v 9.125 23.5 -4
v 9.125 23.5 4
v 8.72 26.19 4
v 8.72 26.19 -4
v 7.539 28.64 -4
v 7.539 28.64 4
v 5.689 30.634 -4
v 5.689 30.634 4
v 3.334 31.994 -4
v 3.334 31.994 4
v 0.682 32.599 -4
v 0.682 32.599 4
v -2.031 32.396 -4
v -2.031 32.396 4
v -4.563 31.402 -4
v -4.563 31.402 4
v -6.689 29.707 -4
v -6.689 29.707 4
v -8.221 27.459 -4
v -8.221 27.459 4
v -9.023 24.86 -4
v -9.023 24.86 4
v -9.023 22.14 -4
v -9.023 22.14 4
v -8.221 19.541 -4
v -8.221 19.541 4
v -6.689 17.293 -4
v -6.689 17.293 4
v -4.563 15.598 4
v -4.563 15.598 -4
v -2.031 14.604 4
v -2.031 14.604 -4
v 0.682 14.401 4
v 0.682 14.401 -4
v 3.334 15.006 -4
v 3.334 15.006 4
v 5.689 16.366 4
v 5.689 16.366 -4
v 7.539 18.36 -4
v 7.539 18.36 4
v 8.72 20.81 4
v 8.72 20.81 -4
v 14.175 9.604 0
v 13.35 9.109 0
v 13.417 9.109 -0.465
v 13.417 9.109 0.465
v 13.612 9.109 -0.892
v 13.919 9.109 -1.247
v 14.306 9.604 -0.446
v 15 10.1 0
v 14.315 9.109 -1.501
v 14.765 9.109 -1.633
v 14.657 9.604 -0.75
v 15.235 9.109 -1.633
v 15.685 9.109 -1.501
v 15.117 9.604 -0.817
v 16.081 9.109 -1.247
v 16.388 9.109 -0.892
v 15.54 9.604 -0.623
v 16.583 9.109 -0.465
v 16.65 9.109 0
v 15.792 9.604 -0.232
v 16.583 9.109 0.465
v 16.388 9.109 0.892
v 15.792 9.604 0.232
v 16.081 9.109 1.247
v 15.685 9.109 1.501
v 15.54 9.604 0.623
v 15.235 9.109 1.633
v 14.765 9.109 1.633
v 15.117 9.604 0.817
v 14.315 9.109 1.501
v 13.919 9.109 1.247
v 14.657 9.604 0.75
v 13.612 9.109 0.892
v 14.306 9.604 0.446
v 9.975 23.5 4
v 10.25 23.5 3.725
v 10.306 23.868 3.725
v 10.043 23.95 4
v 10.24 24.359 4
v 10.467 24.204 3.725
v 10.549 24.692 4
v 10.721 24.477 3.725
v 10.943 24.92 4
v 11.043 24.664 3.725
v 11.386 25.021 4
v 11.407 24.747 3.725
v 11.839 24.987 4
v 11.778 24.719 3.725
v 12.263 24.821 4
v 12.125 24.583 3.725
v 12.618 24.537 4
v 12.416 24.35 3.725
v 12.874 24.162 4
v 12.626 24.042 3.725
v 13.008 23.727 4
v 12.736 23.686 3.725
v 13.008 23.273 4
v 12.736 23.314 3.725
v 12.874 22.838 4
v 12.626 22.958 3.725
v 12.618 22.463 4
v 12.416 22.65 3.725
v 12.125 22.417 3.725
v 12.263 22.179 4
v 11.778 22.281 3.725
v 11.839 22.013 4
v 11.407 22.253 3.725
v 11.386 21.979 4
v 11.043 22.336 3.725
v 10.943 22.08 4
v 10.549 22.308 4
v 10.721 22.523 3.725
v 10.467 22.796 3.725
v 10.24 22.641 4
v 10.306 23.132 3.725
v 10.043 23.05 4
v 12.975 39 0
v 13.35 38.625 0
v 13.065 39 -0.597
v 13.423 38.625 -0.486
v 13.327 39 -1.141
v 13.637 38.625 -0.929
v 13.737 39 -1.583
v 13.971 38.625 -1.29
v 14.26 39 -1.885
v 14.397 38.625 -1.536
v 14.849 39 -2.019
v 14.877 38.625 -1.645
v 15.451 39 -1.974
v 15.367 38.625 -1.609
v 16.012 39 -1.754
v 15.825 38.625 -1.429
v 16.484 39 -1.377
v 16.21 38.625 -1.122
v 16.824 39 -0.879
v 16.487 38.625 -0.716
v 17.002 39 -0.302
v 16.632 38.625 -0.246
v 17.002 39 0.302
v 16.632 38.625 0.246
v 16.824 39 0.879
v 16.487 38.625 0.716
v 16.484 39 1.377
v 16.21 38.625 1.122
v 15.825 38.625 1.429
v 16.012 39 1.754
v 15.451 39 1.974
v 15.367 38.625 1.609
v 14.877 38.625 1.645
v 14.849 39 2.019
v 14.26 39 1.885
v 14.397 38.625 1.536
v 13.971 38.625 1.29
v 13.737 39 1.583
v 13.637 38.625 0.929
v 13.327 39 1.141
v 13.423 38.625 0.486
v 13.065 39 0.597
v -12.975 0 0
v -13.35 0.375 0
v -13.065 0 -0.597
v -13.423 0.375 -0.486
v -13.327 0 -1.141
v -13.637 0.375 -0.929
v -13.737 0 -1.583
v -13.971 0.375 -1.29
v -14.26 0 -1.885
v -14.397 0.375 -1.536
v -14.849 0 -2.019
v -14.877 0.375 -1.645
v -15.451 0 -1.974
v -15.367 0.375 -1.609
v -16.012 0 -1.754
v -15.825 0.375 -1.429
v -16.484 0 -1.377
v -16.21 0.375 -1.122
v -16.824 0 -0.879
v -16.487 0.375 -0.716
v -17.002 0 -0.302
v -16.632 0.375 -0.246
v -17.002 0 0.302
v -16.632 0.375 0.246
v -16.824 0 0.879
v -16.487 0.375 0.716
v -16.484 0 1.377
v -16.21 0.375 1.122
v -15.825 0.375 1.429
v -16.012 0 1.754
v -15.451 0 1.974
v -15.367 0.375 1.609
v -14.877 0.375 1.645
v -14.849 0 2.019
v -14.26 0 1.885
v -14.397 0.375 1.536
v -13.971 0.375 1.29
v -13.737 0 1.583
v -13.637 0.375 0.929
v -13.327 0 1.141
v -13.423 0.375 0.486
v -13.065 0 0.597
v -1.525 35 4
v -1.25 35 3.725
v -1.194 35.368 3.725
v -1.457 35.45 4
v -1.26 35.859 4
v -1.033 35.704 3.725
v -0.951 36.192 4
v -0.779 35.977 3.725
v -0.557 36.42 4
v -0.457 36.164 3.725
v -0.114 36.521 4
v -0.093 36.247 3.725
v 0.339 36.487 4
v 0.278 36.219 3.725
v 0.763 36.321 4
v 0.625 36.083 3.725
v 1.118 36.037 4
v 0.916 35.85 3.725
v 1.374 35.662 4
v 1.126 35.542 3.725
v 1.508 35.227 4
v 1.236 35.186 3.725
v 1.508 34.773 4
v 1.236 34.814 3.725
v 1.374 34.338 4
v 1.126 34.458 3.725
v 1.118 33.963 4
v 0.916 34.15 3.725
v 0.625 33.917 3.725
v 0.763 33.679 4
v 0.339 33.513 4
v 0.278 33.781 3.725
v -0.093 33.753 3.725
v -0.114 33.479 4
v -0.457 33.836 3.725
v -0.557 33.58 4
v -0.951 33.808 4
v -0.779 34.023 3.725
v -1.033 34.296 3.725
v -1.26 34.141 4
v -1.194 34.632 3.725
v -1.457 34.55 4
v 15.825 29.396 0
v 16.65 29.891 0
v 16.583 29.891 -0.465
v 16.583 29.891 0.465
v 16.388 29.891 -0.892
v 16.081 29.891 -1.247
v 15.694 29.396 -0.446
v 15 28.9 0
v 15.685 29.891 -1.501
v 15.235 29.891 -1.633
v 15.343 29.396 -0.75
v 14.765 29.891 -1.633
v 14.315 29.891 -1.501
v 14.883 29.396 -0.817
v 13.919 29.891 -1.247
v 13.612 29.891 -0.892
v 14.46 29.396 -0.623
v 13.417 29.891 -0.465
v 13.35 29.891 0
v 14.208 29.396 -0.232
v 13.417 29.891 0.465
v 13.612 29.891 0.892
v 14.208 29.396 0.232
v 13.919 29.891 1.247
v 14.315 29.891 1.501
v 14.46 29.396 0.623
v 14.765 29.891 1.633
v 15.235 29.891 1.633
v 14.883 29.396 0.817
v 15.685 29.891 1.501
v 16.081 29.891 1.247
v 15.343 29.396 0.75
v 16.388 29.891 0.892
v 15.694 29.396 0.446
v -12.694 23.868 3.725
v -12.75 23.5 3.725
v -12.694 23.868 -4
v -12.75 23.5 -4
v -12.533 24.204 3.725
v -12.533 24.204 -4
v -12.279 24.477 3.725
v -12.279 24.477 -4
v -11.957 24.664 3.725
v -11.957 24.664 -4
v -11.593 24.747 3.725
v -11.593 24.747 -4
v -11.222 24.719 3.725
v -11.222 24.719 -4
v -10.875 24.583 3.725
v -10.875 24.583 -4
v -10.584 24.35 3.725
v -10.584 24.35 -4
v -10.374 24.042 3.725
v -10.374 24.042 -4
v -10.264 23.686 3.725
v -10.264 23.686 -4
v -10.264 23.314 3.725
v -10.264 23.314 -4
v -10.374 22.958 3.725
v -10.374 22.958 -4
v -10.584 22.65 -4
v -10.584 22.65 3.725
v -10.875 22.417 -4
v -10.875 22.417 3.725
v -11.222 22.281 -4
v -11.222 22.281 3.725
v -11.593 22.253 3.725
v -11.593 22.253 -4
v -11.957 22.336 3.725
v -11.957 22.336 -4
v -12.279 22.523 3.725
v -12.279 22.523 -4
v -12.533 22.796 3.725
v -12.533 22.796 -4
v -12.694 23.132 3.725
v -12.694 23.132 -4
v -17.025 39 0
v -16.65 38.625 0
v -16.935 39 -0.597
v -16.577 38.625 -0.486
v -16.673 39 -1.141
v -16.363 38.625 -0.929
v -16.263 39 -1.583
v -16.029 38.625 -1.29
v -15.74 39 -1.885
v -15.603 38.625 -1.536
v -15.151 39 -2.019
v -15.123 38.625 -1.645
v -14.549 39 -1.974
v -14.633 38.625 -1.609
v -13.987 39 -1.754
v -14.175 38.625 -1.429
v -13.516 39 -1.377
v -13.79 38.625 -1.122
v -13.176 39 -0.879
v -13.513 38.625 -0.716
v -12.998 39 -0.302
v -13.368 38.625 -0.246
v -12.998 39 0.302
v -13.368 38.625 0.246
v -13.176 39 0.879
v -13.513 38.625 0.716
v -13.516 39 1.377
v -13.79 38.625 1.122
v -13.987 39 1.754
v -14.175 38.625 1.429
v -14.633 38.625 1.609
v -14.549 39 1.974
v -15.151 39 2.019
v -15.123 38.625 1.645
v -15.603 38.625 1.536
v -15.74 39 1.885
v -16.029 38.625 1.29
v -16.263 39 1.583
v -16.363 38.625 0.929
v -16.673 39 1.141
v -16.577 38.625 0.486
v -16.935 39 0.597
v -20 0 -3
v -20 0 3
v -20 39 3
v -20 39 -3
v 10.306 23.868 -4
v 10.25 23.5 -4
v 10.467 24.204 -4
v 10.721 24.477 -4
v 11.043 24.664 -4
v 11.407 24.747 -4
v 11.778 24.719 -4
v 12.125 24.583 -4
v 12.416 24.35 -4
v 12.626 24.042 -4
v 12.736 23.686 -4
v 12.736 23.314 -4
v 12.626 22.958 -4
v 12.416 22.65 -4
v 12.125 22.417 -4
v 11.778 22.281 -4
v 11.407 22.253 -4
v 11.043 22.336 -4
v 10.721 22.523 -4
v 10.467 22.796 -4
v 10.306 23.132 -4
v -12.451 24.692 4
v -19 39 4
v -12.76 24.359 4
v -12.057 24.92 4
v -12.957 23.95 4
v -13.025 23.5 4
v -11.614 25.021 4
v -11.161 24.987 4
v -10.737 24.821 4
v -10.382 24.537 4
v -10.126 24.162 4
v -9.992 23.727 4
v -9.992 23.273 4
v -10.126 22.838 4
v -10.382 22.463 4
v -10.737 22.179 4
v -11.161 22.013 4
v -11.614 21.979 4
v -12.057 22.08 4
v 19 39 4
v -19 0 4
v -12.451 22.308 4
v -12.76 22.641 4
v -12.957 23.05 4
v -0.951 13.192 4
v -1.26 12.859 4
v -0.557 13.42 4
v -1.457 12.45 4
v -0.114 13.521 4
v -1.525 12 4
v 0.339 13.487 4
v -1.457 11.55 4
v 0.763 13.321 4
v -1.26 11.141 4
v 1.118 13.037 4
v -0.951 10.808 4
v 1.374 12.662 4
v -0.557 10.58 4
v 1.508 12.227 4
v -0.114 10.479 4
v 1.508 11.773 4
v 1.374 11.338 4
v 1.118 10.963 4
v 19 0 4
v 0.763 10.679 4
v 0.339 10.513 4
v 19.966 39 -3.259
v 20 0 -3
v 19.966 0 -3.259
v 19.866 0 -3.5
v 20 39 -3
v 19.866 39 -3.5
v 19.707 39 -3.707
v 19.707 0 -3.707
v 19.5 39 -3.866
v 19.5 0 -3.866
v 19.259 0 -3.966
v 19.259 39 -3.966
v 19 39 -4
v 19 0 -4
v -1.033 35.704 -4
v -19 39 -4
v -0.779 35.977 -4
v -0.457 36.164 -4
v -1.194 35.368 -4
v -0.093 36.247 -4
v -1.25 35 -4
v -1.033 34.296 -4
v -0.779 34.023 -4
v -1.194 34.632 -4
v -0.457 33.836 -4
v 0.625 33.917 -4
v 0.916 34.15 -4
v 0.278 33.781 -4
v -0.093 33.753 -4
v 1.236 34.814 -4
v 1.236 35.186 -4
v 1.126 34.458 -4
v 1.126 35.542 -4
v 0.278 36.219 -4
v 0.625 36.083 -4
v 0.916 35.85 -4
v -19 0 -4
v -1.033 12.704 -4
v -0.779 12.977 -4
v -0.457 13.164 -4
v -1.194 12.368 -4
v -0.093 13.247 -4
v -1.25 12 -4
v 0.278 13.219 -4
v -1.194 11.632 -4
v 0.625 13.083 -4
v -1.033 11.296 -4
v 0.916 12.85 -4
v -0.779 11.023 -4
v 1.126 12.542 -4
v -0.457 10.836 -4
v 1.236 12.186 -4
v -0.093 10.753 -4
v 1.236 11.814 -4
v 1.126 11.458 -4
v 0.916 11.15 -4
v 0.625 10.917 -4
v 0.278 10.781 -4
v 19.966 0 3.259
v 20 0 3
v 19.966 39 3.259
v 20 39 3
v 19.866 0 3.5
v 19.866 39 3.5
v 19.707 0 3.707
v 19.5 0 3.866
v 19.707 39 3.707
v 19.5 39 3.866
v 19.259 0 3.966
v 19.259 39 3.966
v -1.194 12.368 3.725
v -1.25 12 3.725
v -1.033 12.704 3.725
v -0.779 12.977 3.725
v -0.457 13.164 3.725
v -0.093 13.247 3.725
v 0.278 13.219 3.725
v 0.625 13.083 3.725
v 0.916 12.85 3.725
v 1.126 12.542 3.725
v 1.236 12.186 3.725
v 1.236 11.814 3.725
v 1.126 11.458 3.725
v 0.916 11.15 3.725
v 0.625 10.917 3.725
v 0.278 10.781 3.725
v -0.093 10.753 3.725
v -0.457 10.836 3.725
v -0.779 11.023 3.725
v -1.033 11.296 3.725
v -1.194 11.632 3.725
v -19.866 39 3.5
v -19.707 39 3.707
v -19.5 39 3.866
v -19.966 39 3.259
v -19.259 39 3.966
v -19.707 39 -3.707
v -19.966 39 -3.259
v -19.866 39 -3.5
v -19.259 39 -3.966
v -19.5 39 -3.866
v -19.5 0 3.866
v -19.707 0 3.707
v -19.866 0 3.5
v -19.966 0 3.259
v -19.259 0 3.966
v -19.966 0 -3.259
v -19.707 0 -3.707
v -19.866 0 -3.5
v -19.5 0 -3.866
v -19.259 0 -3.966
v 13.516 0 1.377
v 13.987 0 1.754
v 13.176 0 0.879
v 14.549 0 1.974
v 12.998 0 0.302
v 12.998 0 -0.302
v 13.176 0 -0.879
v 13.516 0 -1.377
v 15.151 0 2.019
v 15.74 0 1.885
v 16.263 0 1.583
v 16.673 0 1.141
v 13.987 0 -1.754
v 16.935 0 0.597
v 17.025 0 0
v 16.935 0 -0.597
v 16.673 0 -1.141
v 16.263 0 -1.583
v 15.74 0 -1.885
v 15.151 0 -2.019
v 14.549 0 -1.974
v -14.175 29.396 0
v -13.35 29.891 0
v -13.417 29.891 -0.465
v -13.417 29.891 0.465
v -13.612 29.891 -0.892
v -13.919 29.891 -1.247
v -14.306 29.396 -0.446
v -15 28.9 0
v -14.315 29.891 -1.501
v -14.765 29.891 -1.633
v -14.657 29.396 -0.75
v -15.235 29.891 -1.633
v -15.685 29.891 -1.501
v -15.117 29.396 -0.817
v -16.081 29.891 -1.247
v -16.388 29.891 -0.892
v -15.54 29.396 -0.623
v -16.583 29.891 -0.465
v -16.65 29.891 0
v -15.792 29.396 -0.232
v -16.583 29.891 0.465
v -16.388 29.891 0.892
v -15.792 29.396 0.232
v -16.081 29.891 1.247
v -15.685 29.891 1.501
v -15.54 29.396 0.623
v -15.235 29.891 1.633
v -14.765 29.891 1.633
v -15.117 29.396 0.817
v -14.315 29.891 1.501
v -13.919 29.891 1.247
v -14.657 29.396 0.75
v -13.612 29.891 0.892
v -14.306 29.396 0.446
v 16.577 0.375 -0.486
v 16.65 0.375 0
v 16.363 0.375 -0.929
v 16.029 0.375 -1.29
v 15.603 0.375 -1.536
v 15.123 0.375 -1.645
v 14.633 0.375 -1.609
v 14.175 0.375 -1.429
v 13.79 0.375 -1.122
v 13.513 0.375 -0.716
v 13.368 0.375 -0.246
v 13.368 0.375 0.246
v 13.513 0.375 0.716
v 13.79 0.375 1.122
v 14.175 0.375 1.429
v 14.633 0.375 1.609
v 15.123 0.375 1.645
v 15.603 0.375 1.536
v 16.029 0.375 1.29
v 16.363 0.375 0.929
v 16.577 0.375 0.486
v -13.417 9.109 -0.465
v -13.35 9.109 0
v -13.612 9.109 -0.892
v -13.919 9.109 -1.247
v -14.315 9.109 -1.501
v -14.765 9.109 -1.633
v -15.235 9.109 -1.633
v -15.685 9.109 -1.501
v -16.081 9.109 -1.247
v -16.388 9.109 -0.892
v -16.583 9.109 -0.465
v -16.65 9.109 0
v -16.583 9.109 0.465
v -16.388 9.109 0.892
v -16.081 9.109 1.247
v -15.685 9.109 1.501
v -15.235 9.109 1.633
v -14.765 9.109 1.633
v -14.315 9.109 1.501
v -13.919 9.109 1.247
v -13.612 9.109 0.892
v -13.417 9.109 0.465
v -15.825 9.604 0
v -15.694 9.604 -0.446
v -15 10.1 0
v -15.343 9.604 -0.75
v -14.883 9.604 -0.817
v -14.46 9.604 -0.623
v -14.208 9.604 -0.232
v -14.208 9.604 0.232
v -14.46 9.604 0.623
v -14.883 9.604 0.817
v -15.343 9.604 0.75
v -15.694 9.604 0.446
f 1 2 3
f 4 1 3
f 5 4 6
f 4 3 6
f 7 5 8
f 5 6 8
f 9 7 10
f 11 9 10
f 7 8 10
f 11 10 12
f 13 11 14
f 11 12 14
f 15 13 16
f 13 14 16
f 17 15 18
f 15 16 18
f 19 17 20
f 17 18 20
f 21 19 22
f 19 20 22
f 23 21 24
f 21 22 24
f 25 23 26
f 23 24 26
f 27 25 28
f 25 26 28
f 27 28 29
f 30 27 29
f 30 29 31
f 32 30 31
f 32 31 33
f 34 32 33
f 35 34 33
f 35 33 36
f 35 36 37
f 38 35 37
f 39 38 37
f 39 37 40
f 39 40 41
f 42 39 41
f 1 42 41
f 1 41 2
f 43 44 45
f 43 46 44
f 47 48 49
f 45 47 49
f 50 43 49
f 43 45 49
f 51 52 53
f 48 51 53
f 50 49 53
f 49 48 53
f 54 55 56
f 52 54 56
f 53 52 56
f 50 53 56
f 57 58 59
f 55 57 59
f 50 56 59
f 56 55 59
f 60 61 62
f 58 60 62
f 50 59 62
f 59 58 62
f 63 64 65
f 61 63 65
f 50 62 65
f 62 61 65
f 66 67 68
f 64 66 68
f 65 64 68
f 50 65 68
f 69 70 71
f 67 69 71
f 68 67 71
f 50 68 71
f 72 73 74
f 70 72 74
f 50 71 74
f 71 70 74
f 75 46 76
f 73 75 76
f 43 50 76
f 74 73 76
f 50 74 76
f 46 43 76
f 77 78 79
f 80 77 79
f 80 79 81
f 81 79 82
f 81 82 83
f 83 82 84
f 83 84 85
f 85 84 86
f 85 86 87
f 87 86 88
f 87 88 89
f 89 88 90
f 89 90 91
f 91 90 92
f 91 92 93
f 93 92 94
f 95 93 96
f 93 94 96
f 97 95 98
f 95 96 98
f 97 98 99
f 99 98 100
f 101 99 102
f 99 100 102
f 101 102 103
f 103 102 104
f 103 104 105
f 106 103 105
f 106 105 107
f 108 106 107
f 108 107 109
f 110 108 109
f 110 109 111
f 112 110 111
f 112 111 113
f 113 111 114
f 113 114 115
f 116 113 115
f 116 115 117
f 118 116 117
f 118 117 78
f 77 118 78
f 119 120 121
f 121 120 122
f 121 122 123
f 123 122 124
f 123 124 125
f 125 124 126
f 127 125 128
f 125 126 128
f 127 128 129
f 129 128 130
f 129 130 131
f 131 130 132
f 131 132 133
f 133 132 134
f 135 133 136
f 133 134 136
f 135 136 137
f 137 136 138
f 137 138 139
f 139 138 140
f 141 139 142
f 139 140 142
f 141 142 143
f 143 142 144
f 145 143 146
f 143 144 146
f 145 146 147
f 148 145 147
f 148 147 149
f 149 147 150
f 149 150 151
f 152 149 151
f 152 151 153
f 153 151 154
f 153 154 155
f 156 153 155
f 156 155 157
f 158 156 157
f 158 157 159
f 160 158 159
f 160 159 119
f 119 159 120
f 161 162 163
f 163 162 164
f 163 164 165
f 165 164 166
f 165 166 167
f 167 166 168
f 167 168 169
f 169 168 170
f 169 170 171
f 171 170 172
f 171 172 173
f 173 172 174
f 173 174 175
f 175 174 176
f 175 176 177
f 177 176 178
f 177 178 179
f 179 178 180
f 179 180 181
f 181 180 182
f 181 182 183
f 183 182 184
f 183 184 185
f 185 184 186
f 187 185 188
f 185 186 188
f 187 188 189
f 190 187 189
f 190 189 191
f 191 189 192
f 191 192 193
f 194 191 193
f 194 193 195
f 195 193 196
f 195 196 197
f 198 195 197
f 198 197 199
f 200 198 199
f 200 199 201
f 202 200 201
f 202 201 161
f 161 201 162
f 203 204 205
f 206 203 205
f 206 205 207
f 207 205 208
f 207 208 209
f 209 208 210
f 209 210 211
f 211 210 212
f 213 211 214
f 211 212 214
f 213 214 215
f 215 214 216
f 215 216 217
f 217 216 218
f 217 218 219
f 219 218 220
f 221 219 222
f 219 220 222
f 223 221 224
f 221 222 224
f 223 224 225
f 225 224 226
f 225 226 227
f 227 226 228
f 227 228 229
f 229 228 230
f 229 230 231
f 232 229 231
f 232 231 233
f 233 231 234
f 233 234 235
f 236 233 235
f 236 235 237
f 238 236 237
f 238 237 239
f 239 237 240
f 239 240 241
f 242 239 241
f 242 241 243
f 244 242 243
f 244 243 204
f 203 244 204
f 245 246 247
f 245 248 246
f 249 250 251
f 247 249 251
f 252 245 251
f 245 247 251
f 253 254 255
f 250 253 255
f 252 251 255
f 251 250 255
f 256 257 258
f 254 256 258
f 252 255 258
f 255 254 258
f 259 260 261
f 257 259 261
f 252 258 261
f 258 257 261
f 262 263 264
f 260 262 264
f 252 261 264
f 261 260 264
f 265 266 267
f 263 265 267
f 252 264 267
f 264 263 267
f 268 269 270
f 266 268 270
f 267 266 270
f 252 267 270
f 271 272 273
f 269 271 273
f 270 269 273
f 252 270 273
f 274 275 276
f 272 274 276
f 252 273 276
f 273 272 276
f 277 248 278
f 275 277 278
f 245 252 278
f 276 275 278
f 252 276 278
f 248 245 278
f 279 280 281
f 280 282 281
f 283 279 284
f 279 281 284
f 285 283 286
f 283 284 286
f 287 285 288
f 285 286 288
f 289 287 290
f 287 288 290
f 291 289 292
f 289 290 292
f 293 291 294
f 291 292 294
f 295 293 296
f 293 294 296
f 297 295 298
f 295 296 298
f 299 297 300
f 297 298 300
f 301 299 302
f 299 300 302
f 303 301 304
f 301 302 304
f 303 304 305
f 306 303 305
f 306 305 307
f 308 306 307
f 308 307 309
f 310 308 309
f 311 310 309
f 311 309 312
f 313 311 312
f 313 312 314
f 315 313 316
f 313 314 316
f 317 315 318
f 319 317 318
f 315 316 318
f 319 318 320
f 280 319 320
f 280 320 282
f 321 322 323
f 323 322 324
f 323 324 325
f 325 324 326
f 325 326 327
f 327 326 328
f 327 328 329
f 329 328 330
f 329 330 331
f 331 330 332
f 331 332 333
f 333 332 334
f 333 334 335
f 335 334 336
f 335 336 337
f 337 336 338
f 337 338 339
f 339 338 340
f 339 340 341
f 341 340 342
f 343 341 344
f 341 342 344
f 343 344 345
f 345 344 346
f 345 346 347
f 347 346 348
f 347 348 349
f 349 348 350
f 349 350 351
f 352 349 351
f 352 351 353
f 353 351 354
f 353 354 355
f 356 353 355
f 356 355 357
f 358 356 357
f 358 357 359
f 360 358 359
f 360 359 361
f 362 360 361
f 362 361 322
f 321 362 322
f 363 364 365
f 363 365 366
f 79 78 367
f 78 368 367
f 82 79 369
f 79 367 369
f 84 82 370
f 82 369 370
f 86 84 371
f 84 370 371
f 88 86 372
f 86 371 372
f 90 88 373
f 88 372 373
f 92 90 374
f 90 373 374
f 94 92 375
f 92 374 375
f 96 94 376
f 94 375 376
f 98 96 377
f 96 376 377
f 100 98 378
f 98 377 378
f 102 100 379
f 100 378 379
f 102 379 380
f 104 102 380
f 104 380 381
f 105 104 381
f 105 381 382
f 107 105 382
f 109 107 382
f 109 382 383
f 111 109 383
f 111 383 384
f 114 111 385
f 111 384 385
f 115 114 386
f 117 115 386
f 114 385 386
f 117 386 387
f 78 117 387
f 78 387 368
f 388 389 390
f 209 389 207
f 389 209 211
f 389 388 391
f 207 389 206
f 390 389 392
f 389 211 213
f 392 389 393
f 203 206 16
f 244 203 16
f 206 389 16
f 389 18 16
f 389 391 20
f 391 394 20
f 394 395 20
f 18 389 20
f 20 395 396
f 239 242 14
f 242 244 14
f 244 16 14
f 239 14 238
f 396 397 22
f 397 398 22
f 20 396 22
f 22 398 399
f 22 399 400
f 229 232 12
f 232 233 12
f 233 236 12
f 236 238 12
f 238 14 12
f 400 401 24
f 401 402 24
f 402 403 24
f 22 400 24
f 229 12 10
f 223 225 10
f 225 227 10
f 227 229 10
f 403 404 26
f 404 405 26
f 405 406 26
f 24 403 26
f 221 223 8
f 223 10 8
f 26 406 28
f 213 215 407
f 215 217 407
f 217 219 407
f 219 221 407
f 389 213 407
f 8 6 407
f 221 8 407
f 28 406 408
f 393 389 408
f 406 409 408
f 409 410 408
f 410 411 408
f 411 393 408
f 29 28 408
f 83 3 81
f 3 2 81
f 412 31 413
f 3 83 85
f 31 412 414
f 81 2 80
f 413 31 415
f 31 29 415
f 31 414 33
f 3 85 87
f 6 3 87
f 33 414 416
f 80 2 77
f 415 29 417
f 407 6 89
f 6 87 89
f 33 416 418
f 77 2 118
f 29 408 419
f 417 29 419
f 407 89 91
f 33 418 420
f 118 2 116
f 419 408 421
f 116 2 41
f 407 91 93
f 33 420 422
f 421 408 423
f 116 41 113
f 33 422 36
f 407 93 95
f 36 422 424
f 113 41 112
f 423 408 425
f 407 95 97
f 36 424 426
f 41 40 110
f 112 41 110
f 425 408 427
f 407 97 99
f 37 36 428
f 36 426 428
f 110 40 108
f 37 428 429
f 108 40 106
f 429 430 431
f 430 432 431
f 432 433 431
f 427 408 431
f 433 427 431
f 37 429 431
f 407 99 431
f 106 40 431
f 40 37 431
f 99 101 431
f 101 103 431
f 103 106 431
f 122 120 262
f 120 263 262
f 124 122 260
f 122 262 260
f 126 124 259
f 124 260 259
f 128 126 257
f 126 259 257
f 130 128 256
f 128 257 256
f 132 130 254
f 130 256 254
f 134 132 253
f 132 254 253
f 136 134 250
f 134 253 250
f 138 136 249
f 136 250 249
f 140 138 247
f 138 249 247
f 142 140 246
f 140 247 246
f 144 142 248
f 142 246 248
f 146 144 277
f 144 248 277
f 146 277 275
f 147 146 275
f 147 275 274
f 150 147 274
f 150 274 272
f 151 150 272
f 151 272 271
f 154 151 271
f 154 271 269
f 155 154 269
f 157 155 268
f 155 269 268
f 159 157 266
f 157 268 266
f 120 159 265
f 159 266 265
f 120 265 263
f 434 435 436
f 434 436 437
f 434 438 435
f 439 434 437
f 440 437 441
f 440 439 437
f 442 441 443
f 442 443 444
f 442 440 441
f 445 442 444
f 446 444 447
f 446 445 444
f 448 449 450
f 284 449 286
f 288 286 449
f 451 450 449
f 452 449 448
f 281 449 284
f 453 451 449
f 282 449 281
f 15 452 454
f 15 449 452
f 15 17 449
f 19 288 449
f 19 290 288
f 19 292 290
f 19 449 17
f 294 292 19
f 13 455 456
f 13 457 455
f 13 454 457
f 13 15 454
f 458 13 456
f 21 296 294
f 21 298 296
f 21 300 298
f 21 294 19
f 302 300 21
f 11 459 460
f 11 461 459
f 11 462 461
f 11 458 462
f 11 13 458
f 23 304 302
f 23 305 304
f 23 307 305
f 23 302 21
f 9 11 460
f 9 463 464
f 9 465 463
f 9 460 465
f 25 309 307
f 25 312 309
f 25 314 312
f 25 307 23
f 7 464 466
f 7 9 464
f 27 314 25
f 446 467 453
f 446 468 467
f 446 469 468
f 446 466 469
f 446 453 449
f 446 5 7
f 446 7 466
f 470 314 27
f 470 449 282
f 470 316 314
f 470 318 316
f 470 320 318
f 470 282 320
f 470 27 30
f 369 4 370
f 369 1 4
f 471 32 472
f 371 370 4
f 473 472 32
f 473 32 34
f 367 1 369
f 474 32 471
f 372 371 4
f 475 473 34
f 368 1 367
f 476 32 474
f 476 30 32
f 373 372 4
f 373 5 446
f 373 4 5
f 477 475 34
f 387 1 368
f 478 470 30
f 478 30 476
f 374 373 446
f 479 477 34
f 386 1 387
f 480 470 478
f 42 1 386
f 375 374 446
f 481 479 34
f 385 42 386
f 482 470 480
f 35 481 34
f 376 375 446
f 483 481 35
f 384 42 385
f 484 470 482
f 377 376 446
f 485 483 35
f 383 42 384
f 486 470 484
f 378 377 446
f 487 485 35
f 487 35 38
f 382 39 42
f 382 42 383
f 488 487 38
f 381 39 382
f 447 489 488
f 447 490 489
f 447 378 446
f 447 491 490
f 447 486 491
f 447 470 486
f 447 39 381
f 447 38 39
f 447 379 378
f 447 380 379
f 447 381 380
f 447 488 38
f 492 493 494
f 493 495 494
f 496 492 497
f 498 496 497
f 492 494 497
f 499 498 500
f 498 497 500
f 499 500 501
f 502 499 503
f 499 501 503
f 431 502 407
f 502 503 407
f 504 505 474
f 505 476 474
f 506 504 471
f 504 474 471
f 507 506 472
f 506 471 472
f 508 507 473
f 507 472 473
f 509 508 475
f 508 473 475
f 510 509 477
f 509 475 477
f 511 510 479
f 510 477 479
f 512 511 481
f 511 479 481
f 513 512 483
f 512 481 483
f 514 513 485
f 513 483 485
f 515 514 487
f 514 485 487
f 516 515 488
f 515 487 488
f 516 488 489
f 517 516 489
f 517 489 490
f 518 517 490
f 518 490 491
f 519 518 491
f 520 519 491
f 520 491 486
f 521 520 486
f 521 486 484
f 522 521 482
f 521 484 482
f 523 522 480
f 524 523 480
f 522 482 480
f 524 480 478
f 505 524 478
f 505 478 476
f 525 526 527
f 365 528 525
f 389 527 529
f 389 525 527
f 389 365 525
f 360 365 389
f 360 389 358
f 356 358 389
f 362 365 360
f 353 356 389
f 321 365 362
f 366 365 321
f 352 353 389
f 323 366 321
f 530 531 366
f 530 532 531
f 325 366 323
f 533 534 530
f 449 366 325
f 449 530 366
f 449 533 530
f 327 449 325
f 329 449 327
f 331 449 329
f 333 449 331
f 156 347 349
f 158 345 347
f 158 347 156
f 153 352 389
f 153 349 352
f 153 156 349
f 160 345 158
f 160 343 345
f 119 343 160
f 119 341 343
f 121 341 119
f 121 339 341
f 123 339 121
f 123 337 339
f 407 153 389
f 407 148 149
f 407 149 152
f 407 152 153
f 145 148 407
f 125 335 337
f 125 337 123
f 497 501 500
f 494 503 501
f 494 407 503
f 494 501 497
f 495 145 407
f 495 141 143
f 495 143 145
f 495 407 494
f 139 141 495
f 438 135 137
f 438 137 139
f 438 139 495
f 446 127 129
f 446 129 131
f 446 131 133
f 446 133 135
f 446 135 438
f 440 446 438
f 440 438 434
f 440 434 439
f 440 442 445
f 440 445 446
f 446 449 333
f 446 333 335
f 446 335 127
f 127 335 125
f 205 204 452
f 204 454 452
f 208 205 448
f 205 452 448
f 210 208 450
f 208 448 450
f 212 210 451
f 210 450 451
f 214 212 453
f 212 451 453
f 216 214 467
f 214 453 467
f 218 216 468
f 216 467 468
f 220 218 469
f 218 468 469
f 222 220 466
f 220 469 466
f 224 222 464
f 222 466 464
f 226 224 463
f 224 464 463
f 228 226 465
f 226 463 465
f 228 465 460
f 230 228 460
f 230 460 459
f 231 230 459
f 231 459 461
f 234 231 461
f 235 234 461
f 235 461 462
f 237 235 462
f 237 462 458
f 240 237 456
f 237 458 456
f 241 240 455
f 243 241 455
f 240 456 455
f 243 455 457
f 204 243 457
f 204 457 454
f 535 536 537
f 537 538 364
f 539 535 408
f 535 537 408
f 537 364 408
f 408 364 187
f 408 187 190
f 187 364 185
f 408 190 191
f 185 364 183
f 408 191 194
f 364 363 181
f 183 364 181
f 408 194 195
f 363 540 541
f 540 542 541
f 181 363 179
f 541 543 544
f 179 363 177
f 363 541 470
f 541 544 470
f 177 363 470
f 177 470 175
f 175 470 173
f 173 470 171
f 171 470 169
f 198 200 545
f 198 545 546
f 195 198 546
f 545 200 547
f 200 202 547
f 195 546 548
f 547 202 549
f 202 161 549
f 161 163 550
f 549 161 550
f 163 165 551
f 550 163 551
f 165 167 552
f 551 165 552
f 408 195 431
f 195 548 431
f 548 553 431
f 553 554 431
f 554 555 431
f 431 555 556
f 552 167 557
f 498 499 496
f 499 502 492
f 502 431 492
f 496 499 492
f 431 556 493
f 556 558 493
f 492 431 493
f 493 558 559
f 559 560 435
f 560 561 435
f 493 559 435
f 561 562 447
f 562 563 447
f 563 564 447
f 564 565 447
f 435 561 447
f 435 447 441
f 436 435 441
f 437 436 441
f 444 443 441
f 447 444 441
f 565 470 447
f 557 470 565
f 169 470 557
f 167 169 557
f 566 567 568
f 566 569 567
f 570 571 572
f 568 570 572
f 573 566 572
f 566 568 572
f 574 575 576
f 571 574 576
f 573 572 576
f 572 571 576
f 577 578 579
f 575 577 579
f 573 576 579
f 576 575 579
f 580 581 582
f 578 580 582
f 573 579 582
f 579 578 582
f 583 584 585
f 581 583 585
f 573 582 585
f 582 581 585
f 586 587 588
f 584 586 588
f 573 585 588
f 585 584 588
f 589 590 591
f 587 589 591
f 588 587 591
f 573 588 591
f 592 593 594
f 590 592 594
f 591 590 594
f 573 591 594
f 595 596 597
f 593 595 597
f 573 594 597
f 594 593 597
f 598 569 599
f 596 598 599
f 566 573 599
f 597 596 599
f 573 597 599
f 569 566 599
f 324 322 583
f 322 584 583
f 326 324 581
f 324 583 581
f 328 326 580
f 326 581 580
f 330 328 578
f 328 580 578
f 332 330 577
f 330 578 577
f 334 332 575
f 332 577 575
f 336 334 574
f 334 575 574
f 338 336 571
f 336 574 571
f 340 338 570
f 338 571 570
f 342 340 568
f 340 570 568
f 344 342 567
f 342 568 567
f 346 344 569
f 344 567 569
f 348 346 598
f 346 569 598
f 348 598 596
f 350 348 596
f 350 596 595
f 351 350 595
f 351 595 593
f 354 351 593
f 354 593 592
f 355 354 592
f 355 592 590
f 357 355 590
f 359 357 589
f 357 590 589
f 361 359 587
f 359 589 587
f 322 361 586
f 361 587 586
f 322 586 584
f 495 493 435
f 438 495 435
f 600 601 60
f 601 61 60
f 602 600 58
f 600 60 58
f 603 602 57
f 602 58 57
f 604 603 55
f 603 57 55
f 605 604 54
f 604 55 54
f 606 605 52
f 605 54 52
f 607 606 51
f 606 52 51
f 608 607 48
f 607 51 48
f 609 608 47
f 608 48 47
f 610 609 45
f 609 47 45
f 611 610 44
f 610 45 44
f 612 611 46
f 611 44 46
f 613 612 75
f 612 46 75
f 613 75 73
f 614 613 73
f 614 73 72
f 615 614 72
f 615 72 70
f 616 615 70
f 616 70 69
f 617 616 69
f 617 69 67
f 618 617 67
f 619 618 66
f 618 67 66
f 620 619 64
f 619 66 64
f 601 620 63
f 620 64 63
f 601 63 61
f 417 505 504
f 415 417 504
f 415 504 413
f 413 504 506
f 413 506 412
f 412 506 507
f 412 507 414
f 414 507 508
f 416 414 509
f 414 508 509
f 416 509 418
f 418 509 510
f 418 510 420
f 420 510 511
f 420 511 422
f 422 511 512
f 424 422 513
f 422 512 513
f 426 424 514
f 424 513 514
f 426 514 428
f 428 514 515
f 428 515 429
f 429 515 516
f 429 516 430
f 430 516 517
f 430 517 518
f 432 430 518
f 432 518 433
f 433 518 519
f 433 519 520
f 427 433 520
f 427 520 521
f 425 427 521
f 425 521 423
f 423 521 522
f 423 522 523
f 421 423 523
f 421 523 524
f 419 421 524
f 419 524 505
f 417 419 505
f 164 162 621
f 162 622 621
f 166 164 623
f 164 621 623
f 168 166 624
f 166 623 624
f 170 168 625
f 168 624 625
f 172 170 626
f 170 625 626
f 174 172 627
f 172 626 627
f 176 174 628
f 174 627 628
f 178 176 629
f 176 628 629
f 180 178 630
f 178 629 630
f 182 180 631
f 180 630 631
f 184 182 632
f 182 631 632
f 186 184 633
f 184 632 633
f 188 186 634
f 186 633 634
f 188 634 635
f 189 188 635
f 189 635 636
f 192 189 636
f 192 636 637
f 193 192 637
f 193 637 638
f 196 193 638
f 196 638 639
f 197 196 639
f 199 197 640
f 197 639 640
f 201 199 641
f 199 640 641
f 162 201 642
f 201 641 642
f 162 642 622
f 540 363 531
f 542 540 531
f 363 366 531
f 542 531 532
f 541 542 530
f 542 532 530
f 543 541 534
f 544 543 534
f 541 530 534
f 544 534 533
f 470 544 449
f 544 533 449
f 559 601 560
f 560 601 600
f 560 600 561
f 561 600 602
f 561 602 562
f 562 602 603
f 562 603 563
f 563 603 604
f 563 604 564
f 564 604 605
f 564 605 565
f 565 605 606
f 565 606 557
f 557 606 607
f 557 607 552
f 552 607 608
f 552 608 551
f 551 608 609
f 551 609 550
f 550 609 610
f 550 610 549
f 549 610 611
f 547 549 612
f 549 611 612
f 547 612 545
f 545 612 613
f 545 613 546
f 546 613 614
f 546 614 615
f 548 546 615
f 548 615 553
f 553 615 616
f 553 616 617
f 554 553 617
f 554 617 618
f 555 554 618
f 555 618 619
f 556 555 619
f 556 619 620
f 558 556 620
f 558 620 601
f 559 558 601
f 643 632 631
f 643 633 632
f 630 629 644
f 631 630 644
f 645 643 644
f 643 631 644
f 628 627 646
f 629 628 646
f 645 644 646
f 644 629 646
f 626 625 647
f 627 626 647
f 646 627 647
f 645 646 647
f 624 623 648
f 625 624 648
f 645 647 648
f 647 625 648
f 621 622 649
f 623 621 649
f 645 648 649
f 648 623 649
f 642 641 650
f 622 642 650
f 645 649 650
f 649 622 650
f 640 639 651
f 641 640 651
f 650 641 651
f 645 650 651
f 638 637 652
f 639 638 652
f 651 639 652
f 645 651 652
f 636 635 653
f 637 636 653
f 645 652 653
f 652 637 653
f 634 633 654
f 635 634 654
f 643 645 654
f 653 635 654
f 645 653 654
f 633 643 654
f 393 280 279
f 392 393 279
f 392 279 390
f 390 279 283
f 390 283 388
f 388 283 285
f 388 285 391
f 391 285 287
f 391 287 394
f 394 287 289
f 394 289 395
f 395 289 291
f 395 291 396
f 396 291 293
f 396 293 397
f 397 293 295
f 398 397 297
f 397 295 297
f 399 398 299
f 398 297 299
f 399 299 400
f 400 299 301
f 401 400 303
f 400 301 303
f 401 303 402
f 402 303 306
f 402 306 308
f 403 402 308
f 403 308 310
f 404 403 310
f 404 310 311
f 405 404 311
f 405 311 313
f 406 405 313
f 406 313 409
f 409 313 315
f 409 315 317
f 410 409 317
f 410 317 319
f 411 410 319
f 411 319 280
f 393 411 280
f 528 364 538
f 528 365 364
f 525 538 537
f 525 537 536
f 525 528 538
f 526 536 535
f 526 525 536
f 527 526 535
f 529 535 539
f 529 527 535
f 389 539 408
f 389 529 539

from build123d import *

# Parameters (mm, degrees)
SKETCH_1_W                   = 40
SKETCH_1_H                   = 8
EXTRUDE_1_DEPTH              = 39
HOLE_WIZARD_M4_1_D           = 3.3
HOLE_WIZARD_M4_1_DEPTH       = 9.108579979
HOLE_WIZARD_M4_1_CSINK_D     = 4.05
HOLE_WIZARD_M4_1_CSINK_ANGLE = 90
HOLE_WIZARD_M4_1_TIP         = 0.991420021
SKETCH_5_R                   = 9.125
CUT_EXTRUDE_1_DEPTH          = 39
HOLE_WIZARD_M4_2_D           = 3.3
HOLE_WIZARD_M4_2_DEPTH       = 9.108579979
HOLE_WIZARD_M4_2_CSINK_D     = 4.05
HOLE_WIZARD_M4_2_CSINK_ANGLE = 90
HOLE_WIZARD_M4_2_TIP         = 0.991420021
HOLE_WIZARD_M3_1_D           = 2.5
HOLE_WIZARD_M3_1_CSINK_D     = 3.05
HOLE_WIZARD_M3_1_CSINK_ANGLE = 90
FILLET_1_R                   = 1


with BuildPart() as part:
    # 草图1 → 凸台-拉伸1 (new body)
    with BuildSketch(Plane(origin=(0, 0, 0), x_dir=(1, 0, 0), z_dir=(0, 1, 0))):
        Rectangle(SKETCH_1_W, SKETCH_1_H)
    extrude(amount=EXTRUDE_1_DEPTH)

    # M4 螺纹孔1
    with Locations(Plane(origin=(0, 39, 0), x_dir=(1, 0, 0), z_dir=(0, 1, 0))):
        with Locations((-15, 0), (15, 0)):
            CounterSinkHole(HOLE_WIZARD_M4_1_D / 2, HOLE_WIZARD_M4_1_CSINK_D / 2, depth=HOLE_WIZARD_M4_1_DEPTH, counter_sink_angle=HOLE_WIZARD_M4_1_CSINK_ANGLE)
            with Locations((0, 0, -(HOLE_WIZARD_M4_1_DEPTH + HOLE_WIZARD_M4_1_TIP / 2))):  # 118° drill point
                Cone(0, HOLE_WIZARD_M4_1_D / 2, HOLE_WIZARD_M4_1_TIP, mode=Mode.SUBTRACT)

    # 草图5 → 切除-拉伸1 (cut)
    with BuildSketch(Plane.XY.offset(4)):
        with Locations((0, 23.5)):
            Circle(SKETCH_5_R)
    extrude(amount=-CUT_EXTRUDE_1_DEPTH, mode=Mode.SUBTRACT)

    # M4 螺纹孔2
    with Locations(Plane(origin=(0, 0, 0), x_dir=(-1, 0, 0), z_dir=(0, -1, 0))):
        with Locations((15, 0), (-15, 0)):
            CounterSinkHole(HOLE_WIZARD_M4_2_D / 2, HOLE_WIZARD_M4_2_CSINK_D / 2, depth=HOLE_WIZARD_M4_2_DEPTH, counter_sink_angle=HOLE_WIZARD_M4_2_CSINK_ANGLE)
            with Locations((0, 0, -(HOLE_WIZARD_M4_2_DEPTH + HOLE_WIZARD_M4_2_TIP / 2))):  # 118° drill point
                Cone(0, HOLE_WIZARD_M4_2_D / 2, HOLE_WIZARD_M4_2_TIP, mode=Mode.SUBTRACT)

    # M3 螺纹孔1 (through all)
    with Locations(Plane.XY.offset(4)):
        with Locations((0, 35), (-11.5, 23.5), (11.5, 23.5), (0, 12)):
            CounterSinkHole(HOLE_WIZARD_M3_1_D / 2, HOLE_WIZARD_M3_1_CSINK_D / 2, counter_sink_angle=HOLE_WIZARD_M3_1_CSINK_ANGLE)

    # 圆角1
    fillet_1_edges = [part.edges().sort_by_distance(p)[0] for p in [
        (20, 19.5, 4),
        (-20, 19.5, 4),
        (-20, 19.5, -4),
        (20, 19.5, -4),
    ]]
    fillet(fillet_1_edges, radius=FILLET_1_R)


solid = part.part
